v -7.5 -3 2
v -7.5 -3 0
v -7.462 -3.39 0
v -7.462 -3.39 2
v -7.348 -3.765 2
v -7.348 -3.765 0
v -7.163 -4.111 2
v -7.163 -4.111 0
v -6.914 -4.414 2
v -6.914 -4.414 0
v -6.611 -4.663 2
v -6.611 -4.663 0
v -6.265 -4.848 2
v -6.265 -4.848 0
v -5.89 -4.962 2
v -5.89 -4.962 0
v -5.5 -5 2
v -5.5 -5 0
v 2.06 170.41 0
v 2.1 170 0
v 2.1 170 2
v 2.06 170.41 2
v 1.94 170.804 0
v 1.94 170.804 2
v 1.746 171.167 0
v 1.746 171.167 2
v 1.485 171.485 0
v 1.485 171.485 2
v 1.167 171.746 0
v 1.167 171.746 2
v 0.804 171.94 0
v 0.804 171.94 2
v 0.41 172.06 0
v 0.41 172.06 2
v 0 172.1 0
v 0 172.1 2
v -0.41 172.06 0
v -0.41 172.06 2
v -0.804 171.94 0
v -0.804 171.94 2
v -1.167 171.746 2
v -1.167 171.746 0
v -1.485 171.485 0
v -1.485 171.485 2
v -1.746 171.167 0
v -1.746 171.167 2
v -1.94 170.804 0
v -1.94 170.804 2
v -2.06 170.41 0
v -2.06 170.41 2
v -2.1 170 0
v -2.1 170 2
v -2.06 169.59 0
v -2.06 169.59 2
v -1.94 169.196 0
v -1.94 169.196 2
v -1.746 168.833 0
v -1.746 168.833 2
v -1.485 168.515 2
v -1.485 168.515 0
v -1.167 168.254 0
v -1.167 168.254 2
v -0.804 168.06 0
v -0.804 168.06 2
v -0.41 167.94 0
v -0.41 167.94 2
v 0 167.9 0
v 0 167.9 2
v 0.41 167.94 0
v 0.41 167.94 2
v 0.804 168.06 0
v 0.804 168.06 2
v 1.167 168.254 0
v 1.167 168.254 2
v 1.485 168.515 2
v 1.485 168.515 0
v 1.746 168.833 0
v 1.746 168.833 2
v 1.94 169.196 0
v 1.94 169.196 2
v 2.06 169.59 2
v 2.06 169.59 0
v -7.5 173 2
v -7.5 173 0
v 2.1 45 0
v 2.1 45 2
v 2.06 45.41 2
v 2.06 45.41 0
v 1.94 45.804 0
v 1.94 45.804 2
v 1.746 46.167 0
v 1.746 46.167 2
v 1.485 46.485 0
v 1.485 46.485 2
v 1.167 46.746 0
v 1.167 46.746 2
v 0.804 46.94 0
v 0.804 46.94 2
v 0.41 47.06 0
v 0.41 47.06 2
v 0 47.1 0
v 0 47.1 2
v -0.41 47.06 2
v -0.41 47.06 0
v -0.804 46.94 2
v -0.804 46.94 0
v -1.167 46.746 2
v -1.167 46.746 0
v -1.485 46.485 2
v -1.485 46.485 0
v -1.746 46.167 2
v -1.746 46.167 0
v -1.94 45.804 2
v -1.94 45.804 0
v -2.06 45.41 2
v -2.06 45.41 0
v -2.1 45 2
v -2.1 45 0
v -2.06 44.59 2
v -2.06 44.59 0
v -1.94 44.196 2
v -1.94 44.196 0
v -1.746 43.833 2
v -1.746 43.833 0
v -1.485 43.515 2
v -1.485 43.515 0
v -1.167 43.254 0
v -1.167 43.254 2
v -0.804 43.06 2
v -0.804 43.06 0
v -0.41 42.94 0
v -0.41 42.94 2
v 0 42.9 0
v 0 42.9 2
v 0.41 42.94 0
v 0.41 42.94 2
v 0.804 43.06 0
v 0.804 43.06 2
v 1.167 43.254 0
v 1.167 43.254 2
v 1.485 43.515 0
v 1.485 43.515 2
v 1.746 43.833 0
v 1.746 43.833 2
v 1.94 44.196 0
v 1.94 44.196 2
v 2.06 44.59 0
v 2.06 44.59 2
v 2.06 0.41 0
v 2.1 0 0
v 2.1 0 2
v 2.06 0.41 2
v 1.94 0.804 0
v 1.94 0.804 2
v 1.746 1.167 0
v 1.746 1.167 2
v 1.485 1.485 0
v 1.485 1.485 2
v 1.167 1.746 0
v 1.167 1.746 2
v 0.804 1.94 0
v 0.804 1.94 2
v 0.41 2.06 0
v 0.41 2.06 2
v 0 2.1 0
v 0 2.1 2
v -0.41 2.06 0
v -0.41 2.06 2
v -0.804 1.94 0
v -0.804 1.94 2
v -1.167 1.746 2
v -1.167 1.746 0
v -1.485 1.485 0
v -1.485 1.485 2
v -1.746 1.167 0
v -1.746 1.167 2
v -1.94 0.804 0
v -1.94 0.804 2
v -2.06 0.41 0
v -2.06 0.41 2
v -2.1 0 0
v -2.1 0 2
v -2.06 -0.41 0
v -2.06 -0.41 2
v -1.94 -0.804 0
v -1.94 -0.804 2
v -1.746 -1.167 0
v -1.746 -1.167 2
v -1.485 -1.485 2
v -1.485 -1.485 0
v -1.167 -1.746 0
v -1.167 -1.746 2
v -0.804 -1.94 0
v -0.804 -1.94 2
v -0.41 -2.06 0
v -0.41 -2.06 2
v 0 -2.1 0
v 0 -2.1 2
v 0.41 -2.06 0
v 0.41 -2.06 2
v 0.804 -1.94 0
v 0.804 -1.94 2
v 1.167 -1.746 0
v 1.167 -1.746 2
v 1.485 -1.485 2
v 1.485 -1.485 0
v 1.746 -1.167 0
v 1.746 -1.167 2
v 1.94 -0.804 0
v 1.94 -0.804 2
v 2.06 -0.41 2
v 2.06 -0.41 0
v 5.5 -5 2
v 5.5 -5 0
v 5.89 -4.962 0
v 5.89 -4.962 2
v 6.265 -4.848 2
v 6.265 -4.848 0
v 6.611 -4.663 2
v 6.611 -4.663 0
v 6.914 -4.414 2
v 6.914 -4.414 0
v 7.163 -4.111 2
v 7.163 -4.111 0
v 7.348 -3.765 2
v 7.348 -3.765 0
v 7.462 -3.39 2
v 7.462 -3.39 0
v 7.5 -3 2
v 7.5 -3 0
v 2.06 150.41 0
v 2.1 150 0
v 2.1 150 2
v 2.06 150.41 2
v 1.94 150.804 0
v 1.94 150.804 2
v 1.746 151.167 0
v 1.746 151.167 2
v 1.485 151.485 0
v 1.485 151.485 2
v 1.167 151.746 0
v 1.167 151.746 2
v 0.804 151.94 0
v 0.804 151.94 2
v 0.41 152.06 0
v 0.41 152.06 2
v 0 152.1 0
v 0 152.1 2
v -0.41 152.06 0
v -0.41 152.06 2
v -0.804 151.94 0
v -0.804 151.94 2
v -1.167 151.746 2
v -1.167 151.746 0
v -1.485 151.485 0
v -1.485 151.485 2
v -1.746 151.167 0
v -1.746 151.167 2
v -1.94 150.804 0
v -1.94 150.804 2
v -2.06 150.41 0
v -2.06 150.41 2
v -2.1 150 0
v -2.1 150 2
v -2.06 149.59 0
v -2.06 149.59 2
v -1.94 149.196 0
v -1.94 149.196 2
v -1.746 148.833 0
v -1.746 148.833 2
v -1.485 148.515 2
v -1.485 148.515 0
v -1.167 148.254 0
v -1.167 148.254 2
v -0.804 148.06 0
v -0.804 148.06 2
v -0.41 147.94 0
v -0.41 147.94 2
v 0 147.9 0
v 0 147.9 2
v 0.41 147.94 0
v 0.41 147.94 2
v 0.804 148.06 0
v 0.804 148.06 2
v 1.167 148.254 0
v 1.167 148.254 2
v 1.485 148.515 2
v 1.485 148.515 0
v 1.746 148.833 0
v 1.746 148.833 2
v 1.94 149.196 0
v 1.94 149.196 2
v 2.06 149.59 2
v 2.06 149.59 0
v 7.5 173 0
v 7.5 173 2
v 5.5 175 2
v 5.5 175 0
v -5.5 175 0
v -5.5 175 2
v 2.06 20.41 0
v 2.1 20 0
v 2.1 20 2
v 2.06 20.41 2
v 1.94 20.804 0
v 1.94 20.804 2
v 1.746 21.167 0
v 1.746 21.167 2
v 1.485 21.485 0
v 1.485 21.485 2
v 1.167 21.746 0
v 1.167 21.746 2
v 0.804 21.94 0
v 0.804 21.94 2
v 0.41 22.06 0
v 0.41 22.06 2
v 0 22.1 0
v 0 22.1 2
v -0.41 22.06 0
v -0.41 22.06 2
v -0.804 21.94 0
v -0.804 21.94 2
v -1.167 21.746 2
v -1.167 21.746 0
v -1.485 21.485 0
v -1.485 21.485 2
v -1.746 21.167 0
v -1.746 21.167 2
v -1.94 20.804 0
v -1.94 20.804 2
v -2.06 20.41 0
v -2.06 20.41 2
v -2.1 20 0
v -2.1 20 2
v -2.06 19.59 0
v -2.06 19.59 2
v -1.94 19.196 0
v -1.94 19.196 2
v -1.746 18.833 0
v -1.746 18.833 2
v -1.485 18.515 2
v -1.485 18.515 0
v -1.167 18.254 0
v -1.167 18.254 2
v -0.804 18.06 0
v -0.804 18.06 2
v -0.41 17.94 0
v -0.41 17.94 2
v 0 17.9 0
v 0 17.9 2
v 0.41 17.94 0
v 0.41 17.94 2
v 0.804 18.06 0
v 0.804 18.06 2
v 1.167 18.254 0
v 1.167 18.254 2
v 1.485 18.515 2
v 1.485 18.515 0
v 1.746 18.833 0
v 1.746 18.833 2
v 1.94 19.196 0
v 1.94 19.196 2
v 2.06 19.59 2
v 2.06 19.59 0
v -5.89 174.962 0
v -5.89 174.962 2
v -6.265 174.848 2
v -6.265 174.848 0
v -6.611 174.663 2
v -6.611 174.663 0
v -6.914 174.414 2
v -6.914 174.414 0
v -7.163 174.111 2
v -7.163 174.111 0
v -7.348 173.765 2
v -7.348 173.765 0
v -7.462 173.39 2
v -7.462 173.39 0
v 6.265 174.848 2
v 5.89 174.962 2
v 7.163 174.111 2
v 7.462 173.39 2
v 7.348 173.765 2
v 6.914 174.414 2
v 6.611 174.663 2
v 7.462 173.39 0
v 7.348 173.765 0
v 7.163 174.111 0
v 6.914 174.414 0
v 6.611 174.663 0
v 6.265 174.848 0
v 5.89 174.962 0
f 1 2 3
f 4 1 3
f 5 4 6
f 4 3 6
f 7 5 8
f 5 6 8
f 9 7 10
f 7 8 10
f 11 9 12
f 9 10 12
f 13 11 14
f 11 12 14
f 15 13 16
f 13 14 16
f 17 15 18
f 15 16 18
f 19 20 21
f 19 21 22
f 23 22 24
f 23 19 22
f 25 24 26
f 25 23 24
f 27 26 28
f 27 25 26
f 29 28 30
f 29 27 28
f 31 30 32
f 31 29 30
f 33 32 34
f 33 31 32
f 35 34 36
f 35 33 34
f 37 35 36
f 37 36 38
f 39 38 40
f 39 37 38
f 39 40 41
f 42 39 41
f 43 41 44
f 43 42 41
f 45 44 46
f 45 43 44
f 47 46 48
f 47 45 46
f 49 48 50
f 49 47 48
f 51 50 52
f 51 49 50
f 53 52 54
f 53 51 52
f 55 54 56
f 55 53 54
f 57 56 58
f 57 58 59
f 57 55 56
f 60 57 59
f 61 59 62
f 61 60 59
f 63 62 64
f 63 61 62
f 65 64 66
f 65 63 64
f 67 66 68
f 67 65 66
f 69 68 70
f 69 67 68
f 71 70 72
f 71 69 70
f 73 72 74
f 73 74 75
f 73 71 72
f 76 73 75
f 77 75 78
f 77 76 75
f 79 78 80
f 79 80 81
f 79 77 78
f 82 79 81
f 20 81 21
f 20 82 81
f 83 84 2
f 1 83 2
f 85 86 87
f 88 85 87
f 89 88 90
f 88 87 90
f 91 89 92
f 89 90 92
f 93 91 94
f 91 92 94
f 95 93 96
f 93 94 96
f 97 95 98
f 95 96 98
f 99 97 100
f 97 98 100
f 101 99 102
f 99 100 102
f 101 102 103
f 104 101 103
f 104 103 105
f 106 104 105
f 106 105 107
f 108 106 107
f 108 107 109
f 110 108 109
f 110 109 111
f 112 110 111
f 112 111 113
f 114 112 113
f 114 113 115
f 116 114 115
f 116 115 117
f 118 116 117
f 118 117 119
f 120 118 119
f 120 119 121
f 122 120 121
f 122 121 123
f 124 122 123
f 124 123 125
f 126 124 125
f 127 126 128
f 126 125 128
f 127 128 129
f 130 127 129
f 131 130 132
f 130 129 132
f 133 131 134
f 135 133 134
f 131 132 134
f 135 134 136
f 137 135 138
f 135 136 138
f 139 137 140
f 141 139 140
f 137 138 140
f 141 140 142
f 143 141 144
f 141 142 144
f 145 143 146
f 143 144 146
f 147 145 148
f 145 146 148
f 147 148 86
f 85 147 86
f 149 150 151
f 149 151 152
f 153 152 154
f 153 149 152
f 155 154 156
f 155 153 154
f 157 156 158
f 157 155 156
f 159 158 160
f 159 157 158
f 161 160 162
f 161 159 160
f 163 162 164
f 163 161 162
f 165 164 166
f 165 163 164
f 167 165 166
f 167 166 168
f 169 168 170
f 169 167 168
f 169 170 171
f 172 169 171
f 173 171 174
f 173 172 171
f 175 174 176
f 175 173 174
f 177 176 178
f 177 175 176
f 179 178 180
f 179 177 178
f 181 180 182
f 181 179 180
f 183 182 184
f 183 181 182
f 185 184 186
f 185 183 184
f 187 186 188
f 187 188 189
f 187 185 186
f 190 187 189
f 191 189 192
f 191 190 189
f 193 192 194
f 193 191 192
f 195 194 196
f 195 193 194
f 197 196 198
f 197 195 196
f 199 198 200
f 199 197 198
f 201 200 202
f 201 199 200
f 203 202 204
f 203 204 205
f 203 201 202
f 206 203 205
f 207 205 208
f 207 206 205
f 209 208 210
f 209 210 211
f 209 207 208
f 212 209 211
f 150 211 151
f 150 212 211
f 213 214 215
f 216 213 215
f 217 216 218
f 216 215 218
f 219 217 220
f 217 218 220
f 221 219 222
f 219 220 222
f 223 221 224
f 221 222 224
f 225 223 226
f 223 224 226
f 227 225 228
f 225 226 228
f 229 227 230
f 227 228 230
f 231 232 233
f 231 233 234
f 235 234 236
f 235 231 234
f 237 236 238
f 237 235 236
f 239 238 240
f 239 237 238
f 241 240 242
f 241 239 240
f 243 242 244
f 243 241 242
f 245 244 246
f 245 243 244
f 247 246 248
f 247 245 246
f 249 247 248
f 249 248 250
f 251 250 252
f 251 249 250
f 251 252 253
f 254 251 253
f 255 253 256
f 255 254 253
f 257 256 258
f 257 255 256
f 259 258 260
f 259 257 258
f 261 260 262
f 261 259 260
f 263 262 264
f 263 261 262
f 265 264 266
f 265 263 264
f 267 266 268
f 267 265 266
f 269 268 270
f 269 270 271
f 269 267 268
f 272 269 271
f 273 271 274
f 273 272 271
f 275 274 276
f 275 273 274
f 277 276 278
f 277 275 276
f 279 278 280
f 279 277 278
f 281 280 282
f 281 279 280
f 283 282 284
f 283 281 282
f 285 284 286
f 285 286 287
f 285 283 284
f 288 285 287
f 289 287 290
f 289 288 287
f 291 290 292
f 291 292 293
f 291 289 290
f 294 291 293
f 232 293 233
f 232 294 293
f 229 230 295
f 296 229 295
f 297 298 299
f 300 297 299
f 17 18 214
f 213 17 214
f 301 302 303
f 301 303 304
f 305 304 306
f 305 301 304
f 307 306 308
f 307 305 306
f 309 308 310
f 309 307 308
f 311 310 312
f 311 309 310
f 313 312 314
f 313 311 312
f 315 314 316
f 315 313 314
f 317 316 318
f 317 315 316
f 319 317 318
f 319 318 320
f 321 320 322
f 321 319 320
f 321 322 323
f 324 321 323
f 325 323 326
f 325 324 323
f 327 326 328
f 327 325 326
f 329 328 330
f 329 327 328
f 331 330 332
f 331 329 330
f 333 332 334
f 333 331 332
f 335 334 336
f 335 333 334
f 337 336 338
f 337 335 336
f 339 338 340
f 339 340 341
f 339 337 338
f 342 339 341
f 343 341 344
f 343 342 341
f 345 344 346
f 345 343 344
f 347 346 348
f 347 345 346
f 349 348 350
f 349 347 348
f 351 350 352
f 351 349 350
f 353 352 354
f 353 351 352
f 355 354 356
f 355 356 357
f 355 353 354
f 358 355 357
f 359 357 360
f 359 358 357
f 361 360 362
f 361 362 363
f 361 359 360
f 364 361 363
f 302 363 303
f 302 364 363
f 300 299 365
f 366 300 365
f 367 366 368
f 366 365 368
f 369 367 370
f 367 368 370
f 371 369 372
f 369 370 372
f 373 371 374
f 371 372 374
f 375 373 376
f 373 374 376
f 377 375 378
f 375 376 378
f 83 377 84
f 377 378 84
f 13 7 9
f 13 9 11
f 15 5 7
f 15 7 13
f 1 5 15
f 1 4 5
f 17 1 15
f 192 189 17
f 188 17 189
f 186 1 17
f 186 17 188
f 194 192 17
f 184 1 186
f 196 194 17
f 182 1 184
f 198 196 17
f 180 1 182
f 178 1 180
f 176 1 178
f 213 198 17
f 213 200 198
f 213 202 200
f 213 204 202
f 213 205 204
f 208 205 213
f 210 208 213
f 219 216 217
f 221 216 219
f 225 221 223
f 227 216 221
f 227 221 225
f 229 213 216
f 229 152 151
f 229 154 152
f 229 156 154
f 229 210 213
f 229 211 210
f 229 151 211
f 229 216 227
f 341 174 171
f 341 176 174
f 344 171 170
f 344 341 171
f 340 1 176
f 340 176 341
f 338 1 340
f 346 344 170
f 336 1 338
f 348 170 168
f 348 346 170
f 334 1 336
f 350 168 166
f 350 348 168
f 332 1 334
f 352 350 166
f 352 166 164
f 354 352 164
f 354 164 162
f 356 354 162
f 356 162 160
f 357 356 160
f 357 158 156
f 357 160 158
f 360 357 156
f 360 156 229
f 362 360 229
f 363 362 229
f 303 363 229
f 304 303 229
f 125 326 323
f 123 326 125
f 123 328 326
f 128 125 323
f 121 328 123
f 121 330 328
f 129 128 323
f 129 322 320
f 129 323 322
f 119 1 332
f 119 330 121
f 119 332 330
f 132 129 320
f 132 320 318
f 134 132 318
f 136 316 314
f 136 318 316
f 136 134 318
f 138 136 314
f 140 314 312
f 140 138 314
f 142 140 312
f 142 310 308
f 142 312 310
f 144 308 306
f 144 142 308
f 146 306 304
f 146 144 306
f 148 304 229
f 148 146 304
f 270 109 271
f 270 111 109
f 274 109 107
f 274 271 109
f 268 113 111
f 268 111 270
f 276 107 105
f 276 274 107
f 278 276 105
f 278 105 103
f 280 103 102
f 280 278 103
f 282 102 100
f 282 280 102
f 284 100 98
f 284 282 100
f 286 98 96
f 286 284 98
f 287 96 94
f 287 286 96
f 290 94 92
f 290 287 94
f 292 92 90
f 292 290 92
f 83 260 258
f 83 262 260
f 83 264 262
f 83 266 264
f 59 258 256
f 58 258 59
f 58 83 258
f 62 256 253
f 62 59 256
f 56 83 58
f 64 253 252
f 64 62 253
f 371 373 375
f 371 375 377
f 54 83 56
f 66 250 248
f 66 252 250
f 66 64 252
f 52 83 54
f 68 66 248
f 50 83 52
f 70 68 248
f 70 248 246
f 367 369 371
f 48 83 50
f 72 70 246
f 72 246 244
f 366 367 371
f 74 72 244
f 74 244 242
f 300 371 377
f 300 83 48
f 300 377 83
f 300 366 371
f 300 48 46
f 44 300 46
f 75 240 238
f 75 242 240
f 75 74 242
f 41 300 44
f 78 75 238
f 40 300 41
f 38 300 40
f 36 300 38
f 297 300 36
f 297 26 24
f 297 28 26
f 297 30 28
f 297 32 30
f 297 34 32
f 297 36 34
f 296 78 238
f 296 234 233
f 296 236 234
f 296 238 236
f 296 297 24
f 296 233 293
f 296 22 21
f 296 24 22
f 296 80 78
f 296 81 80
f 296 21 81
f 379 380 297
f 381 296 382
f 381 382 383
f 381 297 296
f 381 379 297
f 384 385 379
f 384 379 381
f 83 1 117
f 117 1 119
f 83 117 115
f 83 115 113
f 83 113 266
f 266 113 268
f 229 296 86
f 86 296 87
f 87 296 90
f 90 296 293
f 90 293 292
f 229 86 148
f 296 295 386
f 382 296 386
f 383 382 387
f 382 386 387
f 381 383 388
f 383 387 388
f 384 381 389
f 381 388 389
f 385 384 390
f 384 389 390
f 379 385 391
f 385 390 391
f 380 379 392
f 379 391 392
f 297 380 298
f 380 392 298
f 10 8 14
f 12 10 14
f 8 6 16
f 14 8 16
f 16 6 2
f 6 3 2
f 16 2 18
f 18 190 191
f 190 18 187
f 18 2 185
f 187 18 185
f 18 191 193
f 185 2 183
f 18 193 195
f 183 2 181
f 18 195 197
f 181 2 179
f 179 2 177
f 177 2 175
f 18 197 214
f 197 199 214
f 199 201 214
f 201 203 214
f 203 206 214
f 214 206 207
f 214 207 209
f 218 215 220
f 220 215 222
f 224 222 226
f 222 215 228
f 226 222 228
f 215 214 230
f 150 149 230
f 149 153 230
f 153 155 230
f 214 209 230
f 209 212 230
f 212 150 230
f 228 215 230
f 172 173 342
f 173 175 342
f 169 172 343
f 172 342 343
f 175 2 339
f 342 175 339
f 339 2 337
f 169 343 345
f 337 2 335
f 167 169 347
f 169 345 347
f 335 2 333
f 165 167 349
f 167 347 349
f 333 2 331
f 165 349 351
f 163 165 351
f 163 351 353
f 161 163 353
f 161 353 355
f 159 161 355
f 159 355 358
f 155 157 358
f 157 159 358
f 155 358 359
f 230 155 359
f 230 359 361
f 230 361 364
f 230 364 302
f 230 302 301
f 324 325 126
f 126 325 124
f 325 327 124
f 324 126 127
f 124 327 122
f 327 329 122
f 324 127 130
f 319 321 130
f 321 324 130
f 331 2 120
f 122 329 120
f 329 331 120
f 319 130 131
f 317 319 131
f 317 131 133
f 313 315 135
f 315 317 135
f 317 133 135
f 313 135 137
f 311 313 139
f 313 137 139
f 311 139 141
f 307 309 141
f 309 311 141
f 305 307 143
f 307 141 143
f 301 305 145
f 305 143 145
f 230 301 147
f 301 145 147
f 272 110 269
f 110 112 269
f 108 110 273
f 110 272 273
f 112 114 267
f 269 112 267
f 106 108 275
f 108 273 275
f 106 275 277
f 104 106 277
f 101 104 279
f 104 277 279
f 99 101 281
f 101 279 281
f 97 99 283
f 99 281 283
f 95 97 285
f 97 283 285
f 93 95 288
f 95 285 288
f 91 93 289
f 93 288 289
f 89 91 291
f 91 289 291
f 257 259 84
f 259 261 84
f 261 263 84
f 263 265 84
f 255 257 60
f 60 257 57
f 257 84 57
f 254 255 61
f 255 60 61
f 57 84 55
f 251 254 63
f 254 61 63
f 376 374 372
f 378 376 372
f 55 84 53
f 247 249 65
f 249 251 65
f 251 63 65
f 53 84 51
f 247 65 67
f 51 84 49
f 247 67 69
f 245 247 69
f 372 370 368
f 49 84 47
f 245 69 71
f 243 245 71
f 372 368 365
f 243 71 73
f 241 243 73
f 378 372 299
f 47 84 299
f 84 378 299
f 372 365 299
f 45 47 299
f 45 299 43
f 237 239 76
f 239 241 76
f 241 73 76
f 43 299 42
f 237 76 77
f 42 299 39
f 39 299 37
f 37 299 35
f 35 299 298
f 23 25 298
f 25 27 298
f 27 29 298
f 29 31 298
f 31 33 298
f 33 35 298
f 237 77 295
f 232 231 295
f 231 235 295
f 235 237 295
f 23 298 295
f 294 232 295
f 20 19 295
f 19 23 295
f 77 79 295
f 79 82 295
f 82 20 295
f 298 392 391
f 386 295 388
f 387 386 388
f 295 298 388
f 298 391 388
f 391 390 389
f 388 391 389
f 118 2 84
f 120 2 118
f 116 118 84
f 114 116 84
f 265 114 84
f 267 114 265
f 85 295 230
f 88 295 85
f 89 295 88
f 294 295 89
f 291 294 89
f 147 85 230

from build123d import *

# Parameters (mm, degrees)
SKETCH_1_R          = 2.1
EXTRUDE_1_DEPTH     = 2
SKETCH_3_R          = 2.1
CUT_EXTRUDE_2_DEPTH = 10


with BuildPart() as part:
    # Эскиз1 → Бобышка-Вытянуть1 (new body)
    with BuildSketch(Plane.XY):
        with BuildLine():
            Line((-7.5, 173), (-7.5, -3))
            ThreePointArc((-7.5, -3), (-6.914213562, -4.414213562), (-5.5, -5))
            Line((-5.5, -5), (5.5, -5))
            ThreePointArc((5.5, -5), (6.914213562, -4.414213562), (7.5, -3))
            Line((7.5, -3), (7.5, 173))
            ThreePointArc((7.5, 173), (6.914213562, 174.414213562), (5.5, 175))
            Line((5.5, 175), (-5.5, 175))
            ThreePointArc((-5.5, 175), (-6.914213562, 174.414213562), (-7.5, 173))
        make_face()
        with Locations((0, 170)):
            Circle(SKETCH_1_R, mode=Mode.SUBTRACT)
        with Locations((0, 150)):
            Circle(SKETCH_1_R, mode=Mode.SUBTRACT)
        with Locations((0, 20)):
            Circle(SKETCH_1_R, mode=Mode.SUBTRACT)
        Circle(SKETCH_1_R, mode=Mode.SUBTRACT)
    extrude(amount=EXTRUDE_1_DEPTH)

    # Эскиз3 → Вырез-Вытянуть2 (cut)
    with BuildSketch(Plane.XY.offset(2)):
        with Locations((0, 45)):
            Circle(SKETCH_3_R)
    extrude(amount=-CUT_EXTRUDE_2_DEPTH, mode=Mode.SUBTRACT)


solid = part.part
